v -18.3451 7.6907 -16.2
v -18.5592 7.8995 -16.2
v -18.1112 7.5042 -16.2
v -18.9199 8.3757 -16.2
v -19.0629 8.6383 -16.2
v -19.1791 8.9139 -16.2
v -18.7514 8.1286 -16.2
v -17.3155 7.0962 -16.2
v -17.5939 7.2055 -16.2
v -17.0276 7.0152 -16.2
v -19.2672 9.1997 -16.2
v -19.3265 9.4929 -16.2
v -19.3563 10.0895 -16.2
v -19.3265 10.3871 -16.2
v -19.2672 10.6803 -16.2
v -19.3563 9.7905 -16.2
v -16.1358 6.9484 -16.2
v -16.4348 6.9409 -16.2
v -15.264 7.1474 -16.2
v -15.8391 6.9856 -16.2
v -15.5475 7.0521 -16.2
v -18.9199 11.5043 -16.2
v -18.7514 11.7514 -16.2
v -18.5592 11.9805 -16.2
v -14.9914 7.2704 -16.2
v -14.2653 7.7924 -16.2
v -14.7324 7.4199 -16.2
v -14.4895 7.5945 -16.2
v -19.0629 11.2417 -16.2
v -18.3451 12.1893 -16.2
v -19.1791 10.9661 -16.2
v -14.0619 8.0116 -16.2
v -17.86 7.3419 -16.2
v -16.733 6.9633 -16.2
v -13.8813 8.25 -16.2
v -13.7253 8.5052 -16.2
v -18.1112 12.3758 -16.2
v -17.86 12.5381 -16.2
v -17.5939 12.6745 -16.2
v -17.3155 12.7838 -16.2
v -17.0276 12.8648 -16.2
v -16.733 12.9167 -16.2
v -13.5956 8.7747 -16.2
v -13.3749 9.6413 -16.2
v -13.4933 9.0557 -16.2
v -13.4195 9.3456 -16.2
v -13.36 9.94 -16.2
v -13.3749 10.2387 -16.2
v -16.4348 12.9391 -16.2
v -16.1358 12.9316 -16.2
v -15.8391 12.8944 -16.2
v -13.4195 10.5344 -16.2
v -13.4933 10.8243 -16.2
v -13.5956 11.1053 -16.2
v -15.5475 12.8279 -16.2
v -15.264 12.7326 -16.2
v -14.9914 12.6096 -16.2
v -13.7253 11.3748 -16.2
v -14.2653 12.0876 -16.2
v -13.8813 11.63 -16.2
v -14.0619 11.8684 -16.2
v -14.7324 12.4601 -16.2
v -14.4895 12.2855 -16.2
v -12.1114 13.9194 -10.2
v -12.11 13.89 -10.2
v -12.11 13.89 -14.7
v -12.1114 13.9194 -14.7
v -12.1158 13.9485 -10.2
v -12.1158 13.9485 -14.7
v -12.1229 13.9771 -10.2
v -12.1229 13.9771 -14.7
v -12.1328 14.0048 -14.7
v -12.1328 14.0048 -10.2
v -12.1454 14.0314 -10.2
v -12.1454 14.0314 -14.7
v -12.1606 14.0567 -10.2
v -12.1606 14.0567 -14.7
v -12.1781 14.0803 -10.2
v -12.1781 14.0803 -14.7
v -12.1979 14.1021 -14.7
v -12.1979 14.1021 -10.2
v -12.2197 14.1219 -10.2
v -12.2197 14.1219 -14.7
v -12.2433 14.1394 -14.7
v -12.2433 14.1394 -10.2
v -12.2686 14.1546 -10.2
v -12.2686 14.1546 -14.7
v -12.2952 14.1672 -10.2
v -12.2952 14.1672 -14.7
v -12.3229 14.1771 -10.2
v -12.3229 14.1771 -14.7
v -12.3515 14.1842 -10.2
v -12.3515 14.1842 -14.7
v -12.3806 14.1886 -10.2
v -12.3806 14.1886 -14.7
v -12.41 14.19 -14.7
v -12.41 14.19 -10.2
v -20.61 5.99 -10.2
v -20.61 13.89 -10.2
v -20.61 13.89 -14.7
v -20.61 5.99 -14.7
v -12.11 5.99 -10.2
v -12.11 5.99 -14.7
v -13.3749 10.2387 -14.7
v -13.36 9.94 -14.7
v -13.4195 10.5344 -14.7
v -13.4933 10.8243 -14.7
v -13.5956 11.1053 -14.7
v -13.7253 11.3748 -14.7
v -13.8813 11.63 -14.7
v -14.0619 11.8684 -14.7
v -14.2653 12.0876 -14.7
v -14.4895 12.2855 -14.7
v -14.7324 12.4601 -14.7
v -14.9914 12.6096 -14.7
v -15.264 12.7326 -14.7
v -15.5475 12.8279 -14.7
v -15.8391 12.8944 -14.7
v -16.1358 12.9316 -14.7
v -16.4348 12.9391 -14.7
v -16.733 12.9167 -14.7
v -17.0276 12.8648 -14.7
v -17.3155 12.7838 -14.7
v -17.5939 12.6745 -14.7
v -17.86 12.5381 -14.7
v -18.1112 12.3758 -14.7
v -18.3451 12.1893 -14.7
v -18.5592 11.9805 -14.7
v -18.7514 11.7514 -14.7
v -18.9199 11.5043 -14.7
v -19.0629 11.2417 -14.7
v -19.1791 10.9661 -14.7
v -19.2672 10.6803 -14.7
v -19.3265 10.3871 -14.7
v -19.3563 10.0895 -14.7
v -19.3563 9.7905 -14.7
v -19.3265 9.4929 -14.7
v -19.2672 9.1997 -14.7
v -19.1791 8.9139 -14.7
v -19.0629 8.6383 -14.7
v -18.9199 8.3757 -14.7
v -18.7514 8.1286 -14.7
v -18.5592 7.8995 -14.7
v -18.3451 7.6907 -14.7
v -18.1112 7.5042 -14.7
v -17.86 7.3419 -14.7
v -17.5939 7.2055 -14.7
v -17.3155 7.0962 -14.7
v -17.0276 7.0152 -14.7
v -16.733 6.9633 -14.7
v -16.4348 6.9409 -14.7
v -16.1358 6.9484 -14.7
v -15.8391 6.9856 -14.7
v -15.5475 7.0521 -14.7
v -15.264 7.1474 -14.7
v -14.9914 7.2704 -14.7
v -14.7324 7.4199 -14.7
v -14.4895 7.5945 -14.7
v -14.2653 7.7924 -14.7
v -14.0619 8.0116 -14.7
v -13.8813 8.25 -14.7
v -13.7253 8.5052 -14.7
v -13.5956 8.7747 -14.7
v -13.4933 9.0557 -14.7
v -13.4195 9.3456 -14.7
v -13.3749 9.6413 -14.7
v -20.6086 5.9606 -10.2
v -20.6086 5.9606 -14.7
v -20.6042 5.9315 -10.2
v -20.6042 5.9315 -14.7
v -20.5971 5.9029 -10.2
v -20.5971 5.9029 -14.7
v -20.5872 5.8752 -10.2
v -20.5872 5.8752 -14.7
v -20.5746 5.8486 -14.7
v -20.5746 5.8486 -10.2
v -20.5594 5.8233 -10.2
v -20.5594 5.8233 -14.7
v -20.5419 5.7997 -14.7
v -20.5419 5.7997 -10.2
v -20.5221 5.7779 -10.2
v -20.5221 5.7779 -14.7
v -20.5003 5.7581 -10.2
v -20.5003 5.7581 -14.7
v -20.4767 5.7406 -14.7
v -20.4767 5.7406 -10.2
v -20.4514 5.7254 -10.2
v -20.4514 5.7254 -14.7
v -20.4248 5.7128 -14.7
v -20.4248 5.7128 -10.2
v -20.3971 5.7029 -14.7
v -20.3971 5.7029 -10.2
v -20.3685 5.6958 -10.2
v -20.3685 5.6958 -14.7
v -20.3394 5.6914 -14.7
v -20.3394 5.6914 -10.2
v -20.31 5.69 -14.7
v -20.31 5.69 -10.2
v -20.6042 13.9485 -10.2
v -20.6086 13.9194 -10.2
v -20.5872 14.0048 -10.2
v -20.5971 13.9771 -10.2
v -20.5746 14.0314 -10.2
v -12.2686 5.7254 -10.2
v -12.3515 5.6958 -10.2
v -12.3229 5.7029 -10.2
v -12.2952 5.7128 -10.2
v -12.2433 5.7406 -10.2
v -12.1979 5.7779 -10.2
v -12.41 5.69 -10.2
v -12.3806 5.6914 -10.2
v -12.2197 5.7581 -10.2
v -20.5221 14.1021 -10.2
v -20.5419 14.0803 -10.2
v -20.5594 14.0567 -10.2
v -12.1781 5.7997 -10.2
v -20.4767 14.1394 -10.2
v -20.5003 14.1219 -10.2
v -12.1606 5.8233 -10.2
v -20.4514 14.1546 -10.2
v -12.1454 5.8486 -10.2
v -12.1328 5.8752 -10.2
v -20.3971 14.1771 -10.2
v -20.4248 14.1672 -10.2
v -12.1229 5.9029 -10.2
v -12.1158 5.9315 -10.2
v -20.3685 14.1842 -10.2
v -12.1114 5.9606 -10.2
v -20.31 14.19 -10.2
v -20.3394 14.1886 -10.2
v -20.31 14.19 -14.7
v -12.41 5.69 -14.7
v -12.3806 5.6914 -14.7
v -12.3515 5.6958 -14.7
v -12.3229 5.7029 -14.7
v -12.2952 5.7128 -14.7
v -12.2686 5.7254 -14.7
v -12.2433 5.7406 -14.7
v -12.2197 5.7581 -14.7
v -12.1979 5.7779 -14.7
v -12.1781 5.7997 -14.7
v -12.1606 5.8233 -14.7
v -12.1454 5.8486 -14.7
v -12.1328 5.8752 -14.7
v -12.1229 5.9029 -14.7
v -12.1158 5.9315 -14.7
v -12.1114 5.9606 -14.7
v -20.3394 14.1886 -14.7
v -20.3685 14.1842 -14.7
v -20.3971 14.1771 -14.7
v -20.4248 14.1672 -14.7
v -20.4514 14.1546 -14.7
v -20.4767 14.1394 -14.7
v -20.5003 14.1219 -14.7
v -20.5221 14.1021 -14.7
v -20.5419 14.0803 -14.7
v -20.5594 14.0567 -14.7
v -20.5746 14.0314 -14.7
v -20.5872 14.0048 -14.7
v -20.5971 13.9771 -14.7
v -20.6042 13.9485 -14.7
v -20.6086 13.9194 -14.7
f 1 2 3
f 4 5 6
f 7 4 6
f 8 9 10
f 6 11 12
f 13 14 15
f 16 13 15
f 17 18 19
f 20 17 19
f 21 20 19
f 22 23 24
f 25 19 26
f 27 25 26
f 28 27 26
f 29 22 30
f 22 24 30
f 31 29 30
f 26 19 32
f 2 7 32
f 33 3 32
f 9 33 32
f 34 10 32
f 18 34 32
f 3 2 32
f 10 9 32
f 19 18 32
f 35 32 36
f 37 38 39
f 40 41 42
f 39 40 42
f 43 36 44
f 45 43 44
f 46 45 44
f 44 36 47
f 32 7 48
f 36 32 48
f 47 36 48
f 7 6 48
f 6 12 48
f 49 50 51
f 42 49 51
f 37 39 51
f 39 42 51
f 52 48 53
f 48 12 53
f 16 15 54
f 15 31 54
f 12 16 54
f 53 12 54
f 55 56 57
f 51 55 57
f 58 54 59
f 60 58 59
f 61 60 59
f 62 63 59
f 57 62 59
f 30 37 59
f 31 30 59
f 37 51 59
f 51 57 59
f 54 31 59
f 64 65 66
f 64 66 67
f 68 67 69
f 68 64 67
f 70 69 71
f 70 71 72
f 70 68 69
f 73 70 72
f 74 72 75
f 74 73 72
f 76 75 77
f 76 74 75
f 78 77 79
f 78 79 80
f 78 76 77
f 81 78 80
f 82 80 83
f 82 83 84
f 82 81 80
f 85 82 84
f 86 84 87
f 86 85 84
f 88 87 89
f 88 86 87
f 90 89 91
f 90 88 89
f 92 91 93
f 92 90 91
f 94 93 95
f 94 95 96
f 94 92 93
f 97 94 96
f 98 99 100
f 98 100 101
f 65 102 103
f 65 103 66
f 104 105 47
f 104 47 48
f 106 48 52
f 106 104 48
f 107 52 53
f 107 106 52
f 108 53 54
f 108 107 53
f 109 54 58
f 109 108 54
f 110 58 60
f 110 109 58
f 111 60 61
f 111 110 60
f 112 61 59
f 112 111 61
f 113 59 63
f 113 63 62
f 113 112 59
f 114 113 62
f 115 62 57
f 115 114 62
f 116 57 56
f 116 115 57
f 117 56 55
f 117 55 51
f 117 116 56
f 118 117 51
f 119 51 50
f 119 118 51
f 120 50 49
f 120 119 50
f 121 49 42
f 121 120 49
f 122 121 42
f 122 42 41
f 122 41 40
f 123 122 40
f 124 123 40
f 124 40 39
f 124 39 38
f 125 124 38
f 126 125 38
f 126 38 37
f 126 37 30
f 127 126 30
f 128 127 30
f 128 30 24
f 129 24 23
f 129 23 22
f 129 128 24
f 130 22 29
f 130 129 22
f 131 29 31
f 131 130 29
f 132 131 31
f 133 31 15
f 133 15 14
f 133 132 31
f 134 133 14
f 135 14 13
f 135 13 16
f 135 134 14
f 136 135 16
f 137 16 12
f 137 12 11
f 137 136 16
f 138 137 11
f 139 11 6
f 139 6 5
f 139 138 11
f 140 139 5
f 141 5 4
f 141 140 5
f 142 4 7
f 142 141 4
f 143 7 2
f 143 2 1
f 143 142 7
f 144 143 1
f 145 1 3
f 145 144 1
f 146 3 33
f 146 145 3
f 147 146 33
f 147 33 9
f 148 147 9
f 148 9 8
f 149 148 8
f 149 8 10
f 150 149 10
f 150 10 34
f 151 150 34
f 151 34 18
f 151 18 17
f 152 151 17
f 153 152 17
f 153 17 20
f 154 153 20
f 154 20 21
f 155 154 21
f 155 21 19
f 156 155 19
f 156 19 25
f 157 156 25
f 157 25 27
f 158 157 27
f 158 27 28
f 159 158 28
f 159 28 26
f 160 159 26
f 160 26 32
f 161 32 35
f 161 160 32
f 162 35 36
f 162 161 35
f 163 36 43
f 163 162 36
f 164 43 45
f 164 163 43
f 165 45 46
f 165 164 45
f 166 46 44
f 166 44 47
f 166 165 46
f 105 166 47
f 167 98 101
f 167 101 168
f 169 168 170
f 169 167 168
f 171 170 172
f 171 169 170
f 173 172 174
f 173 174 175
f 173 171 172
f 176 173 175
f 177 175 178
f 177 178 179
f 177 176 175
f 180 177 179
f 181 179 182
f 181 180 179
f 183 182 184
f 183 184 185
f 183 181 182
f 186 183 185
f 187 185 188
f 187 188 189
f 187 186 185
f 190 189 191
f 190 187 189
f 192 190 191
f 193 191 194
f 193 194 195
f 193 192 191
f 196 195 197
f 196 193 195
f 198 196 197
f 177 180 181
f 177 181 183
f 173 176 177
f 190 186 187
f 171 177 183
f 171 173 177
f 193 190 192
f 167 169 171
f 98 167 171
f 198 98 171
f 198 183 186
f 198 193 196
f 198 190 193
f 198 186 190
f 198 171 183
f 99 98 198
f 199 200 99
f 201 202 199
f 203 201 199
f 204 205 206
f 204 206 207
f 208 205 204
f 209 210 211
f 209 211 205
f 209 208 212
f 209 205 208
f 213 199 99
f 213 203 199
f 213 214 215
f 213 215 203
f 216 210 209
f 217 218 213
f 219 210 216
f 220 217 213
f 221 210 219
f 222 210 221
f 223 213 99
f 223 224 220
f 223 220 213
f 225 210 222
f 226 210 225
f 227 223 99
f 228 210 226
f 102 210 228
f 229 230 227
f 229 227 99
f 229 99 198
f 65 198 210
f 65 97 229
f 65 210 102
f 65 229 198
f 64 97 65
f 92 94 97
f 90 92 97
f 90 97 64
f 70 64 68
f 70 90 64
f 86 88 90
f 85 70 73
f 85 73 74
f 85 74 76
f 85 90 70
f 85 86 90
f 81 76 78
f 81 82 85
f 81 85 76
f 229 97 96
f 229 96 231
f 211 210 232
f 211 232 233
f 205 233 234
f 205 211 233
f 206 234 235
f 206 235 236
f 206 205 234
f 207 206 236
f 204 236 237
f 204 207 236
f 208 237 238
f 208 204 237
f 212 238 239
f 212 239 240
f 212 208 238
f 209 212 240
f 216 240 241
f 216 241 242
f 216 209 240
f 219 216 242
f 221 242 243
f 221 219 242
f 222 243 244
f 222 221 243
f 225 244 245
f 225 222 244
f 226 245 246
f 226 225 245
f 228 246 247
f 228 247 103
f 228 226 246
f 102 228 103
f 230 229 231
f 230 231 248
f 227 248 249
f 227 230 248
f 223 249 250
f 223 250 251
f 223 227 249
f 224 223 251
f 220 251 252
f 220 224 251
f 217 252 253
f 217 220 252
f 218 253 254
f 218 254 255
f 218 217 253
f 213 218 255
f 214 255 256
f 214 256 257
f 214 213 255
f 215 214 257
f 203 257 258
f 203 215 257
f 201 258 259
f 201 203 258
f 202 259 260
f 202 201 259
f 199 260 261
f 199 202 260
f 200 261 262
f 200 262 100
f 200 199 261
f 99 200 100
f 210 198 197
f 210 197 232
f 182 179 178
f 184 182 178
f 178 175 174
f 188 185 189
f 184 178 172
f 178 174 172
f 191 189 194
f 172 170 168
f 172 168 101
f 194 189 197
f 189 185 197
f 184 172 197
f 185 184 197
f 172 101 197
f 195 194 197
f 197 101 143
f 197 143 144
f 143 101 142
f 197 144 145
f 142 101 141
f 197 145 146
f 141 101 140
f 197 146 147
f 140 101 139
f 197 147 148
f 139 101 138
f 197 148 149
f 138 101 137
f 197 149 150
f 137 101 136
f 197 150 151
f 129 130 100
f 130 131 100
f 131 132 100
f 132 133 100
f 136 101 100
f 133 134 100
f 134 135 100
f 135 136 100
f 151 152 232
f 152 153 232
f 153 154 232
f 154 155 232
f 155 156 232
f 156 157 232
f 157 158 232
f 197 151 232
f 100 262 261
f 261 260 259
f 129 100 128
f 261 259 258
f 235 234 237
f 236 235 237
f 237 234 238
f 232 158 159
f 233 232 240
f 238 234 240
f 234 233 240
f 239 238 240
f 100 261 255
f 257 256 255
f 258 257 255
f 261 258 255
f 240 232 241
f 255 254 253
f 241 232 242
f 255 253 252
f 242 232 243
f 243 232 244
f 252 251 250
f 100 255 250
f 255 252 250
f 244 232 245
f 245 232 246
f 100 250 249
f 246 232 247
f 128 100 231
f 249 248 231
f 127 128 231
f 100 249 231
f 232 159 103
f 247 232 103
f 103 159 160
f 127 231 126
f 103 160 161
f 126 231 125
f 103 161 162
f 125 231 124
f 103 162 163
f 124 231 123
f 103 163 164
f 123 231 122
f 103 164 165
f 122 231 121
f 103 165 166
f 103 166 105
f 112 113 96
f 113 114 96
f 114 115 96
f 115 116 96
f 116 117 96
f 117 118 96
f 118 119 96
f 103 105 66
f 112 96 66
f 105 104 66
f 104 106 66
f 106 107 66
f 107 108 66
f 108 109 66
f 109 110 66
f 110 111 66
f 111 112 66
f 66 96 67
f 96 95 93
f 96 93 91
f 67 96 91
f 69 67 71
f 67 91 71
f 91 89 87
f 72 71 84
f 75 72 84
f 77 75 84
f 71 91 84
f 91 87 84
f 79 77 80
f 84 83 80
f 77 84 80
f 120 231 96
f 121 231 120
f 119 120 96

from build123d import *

# Parameters (mm, degrees)
BODY_DEPTH = 4.5
LENS_SK2_R = 3
LENS_DEPTH = 1.5


with BuildPart() as part:
    # Body_Sk1 → Body (new body)
    with BuildSketch(Plane.XY.offset(-10.2)):
        with BuildLine():
            Line((-20.31, 5.69), (-12.41, 5.69))
            ThreePointArc((-12.41, 5.69), (-12.197867966, 5.777867966), (-12.11, 5.99))
            Line((-12.11, 5.99), (-12.11, 13.89))
            ThreePointArc((-12.11, 13.89), (-12.197867966, 14.102132034), (-12.41, 14.19))
            Line((-12.41, 14.19), (-20.31, 14.19))
            ThreePointArc((-20.31, 14.19), (-20.522132034, 14.102132034), (-20.61, 13.89))
            Line((-20.61, 13.89), (-20.61, 5.99))
            ThreePointArc((-20.61, 5.99), (-20.522132034, 5.777867966), (-20.31, 5.69))
        make_face()
    extrude(amount=-BODY_DEPTH)

    # Lens_Sk2 → Lens (add)
    with BuildSketch(Plane.XY.offset(-14.7)):
        with Locations((-16.36, 9.94)):
            Circle(LENS_SK2_R)
    extrude(amount=-LENS_DEPTH)


solid = part.part
